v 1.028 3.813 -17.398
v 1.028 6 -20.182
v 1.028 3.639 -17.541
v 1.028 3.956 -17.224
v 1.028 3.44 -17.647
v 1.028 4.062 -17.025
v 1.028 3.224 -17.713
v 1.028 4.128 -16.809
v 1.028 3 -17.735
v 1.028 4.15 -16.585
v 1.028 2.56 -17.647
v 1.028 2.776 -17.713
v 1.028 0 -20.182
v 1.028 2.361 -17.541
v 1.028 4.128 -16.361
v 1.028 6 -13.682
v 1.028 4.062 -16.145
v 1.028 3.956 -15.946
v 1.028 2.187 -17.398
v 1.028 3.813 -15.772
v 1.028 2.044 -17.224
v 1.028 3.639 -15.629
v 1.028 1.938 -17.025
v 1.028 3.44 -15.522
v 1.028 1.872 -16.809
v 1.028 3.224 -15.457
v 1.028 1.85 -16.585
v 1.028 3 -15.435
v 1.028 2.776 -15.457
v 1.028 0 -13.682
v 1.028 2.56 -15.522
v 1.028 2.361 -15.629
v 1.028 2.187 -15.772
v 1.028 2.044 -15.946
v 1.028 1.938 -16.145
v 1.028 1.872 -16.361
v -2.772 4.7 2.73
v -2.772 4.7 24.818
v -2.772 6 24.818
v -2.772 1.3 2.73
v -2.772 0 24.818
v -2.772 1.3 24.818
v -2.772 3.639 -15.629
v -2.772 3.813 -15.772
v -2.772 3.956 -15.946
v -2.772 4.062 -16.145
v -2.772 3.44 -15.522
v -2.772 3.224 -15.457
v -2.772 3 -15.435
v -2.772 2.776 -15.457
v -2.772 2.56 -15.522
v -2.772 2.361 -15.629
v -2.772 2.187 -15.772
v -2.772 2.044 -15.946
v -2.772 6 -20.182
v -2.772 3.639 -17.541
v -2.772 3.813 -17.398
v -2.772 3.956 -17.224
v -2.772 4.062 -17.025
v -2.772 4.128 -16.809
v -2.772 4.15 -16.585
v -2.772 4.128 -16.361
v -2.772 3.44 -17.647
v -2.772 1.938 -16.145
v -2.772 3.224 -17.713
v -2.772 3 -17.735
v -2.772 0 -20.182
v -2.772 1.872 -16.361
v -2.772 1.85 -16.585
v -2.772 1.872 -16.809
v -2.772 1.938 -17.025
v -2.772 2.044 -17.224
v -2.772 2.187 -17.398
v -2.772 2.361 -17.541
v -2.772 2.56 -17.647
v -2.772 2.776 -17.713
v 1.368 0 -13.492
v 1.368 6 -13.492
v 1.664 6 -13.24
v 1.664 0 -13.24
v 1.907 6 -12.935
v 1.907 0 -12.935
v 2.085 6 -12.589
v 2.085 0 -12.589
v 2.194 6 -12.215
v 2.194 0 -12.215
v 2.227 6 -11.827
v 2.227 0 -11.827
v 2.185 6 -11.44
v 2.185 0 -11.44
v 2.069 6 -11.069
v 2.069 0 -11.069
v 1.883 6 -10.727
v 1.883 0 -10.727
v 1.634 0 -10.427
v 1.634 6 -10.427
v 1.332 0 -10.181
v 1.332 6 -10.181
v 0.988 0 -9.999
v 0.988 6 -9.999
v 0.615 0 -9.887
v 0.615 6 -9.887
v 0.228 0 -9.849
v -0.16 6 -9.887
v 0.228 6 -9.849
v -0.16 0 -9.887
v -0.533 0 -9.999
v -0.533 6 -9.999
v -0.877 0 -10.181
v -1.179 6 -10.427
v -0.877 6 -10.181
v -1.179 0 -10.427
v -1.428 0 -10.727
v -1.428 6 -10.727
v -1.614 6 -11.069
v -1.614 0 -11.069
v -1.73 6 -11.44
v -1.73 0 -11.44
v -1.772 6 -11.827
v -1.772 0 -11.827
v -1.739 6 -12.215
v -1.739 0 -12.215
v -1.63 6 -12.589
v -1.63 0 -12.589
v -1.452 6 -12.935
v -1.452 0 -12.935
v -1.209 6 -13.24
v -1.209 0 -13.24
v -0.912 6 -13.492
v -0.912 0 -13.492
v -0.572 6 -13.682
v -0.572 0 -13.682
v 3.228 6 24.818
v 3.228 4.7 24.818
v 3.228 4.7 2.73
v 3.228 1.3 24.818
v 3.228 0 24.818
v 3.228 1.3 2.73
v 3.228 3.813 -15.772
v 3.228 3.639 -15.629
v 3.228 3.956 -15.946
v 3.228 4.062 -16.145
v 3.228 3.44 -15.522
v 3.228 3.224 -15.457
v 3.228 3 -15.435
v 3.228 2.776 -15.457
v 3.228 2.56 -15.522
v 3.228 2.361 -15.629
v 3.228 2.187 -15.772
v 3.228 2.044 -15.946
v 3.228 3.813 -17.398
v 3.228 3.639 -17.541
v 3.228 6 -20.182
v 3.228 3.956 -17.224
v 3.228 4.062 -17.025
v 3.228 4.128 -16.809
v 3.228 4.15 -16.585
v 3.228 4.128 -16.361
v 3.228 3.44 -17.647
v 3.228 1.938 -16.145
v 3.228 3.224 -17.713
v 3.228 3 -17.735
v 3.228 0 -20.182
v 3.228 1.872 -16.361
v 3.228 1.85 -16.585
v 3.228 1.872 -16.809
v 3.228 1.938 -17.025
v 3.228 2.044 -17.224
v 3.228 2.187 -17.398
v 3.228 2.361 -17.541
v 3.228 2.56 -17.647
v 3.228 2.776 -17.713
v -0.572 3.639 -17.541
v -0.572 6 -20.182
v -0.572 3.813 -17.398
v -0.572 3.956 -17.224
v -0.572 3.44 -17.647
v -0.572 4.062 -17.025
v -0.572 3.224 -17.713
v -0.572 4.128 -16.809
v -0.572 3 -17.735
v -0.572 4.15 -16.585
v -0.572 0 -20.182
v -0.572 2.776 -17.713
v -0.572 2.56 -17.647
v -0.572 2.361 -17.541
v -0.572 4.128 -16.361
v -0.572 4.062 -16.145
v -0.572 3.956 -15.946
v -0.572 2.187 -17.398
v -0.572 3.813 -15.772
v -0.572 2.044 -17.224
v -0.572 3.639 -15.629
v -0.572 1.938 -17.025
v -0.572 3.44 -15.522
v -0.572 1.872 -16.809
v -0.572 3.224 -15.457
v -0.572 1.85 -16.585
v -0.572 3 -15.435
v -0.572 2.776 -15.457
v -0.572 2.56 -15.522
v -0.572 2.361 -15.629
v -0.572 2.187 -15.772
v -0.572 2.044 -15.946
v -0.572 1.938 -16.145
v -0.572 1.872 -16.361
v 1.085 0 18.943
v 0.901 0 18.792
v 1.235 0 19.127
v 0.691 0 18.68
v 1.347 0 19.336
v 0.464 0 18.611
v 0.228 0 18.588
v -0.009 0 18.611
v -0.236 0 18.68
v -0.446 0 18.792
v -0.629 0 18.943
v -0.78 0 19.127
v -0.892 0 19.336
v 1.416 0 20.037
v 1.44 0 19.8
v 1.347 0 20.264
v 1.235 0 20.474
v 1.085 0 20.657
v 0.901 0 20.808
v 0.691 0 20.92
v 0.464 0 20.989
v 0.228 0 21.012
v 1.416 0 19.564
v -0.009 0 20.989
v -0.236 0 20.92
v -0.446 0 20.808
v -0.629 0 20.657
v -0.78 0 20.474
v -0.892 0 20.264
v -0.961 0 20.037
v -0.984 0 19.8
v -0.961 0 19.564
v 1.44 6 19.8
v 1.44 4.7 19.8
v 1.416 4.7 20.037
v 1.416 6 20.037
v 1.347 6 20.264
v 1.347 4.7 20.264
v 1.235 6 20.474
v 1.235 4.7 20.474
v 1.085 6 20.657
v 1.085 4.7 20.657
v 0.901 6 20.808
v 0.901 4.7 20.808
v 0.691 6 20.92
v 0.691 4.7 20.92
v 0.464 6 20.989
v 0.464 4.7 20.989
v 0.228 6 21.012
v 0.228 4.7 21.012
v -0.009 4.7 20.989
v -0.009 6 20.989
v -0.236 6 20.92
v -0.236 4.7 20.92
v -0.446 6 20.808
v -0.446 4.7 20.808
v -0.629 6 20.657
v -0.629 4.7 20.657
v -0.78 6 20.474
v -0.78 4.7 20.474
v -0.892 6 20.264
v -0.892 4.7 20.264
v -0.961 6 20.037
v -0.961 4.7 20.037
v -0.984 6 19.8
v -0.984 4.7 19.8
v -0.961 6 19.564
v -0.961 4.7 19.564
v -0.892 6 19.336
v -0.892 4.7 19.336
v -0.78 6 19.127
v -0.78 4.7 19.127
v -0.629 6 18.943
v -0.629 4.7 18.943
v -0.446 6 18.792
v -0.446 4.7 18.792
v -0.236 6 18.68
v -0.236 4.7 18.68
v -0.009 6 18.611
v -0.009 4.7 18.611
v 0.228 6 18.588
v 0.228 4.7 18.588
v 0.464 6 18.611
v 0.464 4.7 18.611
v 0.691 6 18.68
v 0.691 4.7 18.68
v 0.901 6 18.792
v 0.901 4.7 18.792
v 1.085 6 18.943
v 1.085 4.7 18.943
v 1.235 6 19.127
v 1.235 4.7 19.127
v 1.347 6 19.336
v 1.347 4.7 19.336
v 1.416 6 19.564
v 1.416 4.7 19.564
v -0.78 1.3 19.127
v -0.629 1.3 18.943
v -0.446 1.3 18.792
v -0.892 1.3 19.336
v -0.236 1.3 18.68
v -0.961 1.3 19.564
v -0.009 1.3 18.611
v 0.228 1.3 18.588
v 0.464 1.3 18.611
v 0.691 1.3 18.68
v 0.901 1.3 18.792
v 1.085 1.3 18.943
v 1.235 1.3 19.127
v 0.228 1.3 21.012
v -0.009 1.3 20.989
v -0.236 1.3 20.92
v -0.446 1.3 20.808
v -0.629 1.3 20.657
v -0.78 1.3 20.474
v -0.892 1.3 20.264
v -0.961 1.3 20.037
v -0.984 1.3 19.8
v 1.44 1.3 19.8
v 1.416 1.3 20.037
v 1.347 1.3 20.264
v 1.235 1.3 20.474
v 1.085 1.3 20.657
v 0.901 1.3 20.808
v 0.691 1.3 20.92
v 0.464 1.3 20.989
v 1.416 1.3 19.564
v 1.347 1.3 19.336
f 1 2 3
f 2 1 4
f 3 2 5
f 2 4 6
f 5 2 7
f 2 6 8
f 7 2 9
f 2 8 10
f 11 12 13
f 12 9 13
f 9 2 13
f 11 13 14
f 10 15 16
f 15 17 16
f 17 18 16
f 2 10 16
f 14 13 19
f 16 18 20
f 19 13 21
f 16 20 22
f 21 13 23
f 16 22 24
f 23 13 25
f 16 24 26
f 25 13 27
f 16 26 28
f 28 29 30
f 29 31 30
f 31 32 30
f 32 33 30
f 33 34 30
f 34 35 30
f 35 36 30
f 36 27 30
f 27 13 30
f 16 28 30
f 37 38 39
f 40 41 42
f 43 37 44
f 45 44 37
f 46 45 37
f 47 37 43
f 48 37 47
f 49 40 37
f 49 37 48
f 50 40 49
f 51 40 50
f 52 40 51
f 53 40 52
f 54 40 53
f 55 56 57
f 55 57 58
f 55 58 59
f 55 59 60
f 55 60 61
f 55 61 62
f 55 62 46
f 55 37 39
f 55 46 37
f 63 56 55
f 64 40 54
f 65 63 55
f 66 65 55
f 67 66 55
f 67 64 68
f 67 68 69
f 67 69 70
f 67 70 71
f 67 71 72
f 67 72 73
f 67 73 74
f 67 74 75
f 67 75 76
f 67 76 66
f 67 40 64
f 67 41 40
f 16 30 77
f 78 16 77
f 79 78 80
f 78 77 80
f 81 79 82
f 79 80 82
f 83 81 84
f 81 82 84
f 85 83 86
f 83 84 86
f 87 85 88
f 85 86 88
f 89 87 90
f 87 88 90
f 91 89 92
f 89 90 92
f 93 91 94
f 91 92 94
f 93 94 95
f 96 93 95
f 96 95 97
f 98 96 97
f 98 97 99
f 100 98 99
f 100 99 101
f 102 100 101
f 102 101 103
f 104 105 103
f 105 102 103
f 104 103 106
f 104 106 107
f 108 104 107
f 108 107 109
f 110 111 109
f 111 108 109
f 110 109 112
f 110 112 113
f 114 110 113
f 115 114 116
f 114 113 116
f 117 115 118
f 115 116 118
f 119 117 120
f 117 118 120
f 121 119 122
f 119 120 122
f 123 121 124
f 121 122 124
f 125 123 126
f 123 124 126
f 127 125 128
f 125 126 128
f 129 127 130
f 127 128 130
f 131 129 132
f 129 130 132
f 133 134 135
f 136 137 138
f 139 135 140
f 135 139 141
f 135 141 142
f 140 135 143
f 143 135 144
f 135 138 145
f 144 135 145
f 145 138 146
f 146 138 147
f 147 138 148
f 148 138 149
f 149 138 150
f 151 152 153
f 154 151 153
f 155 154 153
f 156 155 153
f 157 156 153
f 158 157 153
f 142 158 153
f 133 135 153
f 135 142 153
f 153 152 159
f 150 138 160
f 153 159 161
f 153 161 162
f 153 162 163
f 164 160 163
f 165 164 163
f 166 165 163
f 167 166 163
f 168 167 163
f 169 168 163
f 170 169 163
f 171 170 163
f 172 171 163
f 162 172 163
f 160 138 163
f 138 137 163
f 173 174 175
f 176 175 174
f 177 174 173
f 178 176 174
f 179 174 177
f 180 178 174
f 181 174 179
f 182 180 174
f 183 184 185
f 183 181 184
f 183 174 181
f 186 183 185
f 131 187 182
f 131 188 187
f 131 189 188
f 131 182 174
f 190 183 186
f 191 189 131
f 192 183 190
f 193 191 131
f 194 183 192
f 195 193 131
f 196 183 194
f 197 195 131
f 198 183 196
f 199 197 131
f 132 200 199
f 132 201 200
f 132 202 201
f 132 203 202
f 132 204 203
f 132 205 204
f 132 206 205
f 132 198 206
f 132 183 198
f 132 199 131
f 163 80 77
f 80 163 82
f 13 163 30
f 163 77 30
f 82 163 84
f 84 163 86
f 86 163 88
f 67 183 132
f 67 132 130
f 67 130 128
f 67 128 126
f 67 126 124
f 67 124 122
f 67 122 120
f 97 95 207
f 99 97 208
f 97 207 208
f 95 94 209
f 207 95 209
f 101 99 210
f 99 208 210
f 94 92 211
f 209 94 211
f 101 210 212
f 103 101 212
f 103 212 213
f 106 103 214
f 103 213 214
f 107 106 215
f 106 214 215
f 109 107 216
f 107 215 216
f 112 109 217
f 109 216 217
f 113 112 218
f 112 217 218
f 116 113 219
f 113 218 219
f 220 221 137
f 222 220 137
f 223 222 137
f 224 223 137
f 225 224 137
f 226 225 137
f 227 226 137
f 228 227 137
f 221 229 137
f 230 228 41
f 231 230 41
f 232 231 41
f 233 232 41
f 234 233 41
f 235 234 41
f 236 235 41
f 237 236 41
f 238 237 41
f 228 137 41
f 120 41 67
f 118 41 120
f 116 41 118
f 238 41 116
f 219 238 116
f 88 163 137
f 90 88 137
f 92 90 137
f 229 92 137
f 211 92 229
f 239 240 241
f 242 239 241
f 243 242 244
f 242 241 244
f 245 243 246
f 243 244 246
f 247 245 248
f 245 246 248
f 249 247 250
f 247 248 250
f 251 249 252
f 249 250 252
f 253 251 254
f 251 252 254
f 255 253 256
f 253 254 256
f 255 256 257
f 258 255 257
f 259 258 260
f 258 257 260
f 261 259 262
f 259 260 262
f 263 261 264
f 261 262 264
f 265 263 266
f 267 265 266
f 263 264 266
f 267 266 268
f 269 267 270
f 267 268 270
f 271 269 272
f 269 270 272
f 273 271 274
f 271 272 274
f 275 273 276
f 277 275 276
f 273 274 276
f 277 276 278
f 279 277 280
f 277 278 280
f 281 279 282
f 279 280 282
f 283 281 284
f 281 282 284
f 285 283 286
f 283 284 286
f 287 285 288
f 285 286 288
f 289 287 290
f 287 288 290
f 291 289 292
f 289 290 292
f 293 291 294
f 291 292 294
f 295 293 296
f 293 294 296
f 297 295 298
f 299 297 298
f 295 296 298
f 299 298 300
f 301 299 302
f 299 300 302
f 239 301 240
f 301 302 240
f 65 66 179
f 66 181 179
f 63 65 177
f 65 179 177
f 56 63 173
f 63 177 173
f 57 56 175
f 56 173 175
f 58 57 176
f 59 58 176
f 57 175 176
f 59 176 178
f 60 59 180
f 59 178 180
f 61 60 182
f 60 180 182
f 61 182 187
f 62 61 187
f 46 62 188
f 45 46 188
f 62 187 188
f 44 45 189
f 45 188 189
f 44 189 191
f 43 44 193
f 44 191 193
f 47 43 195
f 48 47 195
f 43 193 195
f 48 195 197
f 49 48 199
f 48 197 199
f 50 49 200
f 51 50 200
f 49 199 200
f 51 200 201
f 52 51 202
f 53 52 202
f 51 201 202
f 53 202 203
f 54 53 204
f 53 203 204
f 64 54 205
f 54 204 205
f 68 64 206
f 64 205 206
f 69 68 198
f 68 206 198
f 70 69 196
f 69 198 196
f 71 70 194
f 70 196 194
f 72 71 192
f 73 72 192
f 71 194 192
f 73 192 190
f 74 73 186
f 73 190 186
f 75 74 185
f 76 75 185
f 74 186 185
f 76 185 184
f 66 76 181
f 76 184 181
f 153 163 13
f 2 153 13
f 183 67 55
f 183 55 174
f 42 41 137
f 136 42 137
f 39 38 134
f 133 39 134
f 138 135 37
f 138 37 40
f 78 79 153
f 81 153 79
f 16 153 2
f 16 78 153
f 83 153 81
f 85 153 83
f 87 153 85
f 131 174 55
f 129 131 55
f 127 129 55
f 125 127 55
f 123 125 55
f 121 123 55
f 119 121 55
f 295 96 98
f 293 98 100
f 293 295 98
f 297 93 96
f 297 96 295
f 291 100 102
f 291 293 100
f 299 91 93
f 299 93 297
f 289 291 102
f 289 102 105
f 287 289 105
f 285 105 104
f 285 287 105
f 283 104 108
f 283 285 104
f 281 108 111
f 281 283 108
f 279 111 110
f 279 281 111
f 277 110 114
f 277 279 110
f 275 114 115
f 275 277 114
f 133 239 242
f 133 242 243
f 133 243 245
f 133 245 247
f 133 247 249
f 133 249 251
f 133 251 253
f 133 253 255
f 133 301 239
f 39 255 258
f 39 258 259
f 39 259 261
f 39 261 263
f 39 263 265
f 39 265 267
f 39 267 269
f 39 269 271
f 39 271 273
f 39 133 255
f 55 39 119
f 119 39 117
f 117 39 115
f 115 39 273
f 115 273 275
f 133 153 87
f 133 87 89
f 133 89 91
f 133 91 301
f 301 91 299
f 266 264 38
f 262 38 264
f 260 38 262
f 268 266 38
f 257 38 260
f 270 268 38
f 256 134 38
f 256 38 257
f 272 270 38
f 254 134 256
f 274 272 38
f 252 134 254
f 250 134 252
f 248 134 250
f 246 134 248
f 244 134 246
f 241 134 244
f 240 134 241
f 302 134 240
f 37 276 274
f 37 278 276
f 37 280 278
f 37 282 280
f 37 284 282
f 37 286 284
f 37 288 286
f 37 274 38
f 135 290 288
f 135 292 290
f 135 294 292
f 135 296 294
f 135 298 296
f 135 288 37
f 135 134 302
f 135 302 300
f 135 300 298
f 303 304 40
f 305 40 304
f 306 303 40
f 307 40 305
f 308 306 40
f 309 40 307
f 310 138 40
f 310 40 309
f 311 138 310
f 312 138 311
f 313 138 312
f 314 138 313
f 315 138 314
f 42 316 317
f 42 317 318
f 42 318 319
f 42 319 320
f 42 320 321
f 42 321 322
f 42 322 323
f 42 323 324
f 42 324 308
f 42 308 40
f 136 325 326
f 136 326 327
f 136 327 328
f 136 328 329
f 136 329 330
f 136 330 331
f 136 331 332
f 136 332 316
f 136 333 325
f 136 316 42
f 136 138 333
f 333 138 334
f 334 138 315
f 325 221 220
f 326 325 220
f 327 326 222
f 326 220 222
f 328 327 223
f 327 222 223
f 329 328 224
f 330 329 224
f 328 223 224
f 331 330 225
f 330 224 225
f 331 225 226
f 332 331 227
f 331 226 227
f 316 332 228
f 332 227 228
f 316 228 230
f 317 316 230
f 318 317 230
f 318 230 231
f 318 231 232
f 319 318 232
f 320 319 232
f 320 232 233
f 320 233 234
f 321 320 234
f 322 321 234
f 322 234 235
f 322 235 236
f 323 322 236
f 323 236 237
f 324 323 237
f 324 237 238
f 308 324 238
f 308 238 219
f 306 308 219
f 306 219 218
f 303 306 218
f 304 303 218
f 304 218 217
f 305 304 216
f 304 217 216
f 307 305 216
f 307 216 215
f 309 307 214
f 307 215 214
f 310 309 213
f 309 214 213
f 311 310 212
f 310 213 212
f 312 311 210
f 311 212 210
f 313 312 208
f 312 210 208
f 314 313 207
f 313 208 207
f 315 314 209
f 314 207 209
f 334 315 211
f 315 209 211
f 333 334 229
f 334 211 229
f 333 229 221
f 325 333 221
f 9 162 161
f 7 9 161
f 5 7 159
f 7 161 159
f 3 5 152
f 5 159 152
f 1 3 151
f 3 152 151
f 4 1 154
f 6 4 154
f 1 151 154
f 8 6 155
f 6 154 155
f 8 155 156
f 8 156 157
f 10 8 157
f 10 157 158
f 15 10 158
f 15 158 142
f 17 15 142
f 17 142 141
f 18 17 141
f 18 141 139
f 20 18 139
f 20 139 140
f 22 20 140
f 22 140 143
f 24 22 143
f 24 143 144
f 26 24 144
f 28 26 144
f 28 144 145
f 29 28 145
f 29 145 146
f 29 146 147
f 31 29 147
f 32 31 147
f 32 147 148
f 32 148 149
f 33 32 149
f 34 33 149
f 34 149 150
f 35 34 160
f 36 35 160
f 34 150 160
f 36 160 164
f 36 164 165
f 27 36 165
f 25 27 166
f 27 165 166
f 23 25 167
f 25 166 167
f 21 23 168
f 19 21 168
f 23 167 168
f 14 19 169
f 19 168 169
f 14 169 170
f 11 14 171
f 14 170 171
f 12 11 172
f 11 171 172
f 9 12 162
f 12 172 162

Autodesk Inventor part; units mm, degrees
ref_plane "YZ Plane" through (0, 0, 0) normal (1, 0, 0) x (0, 1, 0)
ref_plane "XZ Plane" through (0, 0, 0) normal (0, 1, 0) x (-1, 0, 0)
ref_plane "XY Plane" through (0, 0, 0) normal (0, 0, 1) x (1, 0, 0)
sketch "Sketch1" plane through (0, 0, 0) normal (0, 1, 0) x (-1, 0, 0)
  point P0 (0, 0)
sketch "Sketch2" plane through (0, 0, 0) normal (0, 1, 0) x (-1, 0, 0)
  line L0 (2.7724, 24.8182) -> (-3.2276, 24.8182)
  line L1 (2.7724, 24.8182) -> (2.7724, -20.1818)
  line L2 (-3.2276, 24.8182) -> (-3.2276, -20.1818)
  line L3 (-3.2276, -20.1818) -> (-1.0276, -20.1818)
  line L4 (-1.0276, -20.1818) -> (-1.0276, -13.6818)
  line L5 (2.7724, -20.1818) -> (0.5724, -20.1818)
  line L6 (0.5724, -20.1818) -> (0.5724, -13.6818)
  arc A0 (0.5724, -13.6818) -> (-1.0276, -13.6818) centre (-0.2276, -11.8488) ccw
  point P0 (0, 0)
  dimension "d0" = 6
  dimension "d1" = 45
  dimension "d2" = 45
  dimension "d3" = 2.2
  dimension "d4" = 2.2
  dimension "d5" = 6.5
  dimension "d6" = 2
extrude "Extrusion1" add sketch "Sketch2" along normal blind 6
sketch "Sketch4" plane through (0, 0, 0) normal (0, -1, 0) x (1, 0, 0)
  line L0 (-2.7724, 24.8182) -> (3.2276, 24.8182) projected
  circle A0 centre (0.2276, 19.8001) radius 1.2121
  point P0 (0, 0)
extrude "Extrusion3" cut sketch "Sketch4" against normal blind 10.9375
sketch "Sketch5" plane through (3.2276, 0, 24.8182) normal (1, 0, 0) x (0, 0, -1)
  circle A0 centre (41.4031, 3) radius 1.15
  line L0 (0, 0) -> (0, 6) projected
  line L1 (0, 4.7) -> (22.0881, 4.7)
  line L2 (22.0881, 4.7) -> (22.0881, 1.3)
  line L3 (22.0881, 1.3) -> (0, 1.3)
  line L4 (0, 4.7) -> (0, 1.3)
  point P0 (24.8182, 0)
  dimension "d13" = 2.3
  dimension "d18" = 3.4
  dimension "d19" = 1.3
extrude "Extrusion4" cut sketch "Sketch5" against normal blind 14.6375 contours A0
extrude "Extrusion5" cut sketch "Sketch5" against normal blind 23.4625 contours L0 L1 L2 L3
properties part number "LInk1"
